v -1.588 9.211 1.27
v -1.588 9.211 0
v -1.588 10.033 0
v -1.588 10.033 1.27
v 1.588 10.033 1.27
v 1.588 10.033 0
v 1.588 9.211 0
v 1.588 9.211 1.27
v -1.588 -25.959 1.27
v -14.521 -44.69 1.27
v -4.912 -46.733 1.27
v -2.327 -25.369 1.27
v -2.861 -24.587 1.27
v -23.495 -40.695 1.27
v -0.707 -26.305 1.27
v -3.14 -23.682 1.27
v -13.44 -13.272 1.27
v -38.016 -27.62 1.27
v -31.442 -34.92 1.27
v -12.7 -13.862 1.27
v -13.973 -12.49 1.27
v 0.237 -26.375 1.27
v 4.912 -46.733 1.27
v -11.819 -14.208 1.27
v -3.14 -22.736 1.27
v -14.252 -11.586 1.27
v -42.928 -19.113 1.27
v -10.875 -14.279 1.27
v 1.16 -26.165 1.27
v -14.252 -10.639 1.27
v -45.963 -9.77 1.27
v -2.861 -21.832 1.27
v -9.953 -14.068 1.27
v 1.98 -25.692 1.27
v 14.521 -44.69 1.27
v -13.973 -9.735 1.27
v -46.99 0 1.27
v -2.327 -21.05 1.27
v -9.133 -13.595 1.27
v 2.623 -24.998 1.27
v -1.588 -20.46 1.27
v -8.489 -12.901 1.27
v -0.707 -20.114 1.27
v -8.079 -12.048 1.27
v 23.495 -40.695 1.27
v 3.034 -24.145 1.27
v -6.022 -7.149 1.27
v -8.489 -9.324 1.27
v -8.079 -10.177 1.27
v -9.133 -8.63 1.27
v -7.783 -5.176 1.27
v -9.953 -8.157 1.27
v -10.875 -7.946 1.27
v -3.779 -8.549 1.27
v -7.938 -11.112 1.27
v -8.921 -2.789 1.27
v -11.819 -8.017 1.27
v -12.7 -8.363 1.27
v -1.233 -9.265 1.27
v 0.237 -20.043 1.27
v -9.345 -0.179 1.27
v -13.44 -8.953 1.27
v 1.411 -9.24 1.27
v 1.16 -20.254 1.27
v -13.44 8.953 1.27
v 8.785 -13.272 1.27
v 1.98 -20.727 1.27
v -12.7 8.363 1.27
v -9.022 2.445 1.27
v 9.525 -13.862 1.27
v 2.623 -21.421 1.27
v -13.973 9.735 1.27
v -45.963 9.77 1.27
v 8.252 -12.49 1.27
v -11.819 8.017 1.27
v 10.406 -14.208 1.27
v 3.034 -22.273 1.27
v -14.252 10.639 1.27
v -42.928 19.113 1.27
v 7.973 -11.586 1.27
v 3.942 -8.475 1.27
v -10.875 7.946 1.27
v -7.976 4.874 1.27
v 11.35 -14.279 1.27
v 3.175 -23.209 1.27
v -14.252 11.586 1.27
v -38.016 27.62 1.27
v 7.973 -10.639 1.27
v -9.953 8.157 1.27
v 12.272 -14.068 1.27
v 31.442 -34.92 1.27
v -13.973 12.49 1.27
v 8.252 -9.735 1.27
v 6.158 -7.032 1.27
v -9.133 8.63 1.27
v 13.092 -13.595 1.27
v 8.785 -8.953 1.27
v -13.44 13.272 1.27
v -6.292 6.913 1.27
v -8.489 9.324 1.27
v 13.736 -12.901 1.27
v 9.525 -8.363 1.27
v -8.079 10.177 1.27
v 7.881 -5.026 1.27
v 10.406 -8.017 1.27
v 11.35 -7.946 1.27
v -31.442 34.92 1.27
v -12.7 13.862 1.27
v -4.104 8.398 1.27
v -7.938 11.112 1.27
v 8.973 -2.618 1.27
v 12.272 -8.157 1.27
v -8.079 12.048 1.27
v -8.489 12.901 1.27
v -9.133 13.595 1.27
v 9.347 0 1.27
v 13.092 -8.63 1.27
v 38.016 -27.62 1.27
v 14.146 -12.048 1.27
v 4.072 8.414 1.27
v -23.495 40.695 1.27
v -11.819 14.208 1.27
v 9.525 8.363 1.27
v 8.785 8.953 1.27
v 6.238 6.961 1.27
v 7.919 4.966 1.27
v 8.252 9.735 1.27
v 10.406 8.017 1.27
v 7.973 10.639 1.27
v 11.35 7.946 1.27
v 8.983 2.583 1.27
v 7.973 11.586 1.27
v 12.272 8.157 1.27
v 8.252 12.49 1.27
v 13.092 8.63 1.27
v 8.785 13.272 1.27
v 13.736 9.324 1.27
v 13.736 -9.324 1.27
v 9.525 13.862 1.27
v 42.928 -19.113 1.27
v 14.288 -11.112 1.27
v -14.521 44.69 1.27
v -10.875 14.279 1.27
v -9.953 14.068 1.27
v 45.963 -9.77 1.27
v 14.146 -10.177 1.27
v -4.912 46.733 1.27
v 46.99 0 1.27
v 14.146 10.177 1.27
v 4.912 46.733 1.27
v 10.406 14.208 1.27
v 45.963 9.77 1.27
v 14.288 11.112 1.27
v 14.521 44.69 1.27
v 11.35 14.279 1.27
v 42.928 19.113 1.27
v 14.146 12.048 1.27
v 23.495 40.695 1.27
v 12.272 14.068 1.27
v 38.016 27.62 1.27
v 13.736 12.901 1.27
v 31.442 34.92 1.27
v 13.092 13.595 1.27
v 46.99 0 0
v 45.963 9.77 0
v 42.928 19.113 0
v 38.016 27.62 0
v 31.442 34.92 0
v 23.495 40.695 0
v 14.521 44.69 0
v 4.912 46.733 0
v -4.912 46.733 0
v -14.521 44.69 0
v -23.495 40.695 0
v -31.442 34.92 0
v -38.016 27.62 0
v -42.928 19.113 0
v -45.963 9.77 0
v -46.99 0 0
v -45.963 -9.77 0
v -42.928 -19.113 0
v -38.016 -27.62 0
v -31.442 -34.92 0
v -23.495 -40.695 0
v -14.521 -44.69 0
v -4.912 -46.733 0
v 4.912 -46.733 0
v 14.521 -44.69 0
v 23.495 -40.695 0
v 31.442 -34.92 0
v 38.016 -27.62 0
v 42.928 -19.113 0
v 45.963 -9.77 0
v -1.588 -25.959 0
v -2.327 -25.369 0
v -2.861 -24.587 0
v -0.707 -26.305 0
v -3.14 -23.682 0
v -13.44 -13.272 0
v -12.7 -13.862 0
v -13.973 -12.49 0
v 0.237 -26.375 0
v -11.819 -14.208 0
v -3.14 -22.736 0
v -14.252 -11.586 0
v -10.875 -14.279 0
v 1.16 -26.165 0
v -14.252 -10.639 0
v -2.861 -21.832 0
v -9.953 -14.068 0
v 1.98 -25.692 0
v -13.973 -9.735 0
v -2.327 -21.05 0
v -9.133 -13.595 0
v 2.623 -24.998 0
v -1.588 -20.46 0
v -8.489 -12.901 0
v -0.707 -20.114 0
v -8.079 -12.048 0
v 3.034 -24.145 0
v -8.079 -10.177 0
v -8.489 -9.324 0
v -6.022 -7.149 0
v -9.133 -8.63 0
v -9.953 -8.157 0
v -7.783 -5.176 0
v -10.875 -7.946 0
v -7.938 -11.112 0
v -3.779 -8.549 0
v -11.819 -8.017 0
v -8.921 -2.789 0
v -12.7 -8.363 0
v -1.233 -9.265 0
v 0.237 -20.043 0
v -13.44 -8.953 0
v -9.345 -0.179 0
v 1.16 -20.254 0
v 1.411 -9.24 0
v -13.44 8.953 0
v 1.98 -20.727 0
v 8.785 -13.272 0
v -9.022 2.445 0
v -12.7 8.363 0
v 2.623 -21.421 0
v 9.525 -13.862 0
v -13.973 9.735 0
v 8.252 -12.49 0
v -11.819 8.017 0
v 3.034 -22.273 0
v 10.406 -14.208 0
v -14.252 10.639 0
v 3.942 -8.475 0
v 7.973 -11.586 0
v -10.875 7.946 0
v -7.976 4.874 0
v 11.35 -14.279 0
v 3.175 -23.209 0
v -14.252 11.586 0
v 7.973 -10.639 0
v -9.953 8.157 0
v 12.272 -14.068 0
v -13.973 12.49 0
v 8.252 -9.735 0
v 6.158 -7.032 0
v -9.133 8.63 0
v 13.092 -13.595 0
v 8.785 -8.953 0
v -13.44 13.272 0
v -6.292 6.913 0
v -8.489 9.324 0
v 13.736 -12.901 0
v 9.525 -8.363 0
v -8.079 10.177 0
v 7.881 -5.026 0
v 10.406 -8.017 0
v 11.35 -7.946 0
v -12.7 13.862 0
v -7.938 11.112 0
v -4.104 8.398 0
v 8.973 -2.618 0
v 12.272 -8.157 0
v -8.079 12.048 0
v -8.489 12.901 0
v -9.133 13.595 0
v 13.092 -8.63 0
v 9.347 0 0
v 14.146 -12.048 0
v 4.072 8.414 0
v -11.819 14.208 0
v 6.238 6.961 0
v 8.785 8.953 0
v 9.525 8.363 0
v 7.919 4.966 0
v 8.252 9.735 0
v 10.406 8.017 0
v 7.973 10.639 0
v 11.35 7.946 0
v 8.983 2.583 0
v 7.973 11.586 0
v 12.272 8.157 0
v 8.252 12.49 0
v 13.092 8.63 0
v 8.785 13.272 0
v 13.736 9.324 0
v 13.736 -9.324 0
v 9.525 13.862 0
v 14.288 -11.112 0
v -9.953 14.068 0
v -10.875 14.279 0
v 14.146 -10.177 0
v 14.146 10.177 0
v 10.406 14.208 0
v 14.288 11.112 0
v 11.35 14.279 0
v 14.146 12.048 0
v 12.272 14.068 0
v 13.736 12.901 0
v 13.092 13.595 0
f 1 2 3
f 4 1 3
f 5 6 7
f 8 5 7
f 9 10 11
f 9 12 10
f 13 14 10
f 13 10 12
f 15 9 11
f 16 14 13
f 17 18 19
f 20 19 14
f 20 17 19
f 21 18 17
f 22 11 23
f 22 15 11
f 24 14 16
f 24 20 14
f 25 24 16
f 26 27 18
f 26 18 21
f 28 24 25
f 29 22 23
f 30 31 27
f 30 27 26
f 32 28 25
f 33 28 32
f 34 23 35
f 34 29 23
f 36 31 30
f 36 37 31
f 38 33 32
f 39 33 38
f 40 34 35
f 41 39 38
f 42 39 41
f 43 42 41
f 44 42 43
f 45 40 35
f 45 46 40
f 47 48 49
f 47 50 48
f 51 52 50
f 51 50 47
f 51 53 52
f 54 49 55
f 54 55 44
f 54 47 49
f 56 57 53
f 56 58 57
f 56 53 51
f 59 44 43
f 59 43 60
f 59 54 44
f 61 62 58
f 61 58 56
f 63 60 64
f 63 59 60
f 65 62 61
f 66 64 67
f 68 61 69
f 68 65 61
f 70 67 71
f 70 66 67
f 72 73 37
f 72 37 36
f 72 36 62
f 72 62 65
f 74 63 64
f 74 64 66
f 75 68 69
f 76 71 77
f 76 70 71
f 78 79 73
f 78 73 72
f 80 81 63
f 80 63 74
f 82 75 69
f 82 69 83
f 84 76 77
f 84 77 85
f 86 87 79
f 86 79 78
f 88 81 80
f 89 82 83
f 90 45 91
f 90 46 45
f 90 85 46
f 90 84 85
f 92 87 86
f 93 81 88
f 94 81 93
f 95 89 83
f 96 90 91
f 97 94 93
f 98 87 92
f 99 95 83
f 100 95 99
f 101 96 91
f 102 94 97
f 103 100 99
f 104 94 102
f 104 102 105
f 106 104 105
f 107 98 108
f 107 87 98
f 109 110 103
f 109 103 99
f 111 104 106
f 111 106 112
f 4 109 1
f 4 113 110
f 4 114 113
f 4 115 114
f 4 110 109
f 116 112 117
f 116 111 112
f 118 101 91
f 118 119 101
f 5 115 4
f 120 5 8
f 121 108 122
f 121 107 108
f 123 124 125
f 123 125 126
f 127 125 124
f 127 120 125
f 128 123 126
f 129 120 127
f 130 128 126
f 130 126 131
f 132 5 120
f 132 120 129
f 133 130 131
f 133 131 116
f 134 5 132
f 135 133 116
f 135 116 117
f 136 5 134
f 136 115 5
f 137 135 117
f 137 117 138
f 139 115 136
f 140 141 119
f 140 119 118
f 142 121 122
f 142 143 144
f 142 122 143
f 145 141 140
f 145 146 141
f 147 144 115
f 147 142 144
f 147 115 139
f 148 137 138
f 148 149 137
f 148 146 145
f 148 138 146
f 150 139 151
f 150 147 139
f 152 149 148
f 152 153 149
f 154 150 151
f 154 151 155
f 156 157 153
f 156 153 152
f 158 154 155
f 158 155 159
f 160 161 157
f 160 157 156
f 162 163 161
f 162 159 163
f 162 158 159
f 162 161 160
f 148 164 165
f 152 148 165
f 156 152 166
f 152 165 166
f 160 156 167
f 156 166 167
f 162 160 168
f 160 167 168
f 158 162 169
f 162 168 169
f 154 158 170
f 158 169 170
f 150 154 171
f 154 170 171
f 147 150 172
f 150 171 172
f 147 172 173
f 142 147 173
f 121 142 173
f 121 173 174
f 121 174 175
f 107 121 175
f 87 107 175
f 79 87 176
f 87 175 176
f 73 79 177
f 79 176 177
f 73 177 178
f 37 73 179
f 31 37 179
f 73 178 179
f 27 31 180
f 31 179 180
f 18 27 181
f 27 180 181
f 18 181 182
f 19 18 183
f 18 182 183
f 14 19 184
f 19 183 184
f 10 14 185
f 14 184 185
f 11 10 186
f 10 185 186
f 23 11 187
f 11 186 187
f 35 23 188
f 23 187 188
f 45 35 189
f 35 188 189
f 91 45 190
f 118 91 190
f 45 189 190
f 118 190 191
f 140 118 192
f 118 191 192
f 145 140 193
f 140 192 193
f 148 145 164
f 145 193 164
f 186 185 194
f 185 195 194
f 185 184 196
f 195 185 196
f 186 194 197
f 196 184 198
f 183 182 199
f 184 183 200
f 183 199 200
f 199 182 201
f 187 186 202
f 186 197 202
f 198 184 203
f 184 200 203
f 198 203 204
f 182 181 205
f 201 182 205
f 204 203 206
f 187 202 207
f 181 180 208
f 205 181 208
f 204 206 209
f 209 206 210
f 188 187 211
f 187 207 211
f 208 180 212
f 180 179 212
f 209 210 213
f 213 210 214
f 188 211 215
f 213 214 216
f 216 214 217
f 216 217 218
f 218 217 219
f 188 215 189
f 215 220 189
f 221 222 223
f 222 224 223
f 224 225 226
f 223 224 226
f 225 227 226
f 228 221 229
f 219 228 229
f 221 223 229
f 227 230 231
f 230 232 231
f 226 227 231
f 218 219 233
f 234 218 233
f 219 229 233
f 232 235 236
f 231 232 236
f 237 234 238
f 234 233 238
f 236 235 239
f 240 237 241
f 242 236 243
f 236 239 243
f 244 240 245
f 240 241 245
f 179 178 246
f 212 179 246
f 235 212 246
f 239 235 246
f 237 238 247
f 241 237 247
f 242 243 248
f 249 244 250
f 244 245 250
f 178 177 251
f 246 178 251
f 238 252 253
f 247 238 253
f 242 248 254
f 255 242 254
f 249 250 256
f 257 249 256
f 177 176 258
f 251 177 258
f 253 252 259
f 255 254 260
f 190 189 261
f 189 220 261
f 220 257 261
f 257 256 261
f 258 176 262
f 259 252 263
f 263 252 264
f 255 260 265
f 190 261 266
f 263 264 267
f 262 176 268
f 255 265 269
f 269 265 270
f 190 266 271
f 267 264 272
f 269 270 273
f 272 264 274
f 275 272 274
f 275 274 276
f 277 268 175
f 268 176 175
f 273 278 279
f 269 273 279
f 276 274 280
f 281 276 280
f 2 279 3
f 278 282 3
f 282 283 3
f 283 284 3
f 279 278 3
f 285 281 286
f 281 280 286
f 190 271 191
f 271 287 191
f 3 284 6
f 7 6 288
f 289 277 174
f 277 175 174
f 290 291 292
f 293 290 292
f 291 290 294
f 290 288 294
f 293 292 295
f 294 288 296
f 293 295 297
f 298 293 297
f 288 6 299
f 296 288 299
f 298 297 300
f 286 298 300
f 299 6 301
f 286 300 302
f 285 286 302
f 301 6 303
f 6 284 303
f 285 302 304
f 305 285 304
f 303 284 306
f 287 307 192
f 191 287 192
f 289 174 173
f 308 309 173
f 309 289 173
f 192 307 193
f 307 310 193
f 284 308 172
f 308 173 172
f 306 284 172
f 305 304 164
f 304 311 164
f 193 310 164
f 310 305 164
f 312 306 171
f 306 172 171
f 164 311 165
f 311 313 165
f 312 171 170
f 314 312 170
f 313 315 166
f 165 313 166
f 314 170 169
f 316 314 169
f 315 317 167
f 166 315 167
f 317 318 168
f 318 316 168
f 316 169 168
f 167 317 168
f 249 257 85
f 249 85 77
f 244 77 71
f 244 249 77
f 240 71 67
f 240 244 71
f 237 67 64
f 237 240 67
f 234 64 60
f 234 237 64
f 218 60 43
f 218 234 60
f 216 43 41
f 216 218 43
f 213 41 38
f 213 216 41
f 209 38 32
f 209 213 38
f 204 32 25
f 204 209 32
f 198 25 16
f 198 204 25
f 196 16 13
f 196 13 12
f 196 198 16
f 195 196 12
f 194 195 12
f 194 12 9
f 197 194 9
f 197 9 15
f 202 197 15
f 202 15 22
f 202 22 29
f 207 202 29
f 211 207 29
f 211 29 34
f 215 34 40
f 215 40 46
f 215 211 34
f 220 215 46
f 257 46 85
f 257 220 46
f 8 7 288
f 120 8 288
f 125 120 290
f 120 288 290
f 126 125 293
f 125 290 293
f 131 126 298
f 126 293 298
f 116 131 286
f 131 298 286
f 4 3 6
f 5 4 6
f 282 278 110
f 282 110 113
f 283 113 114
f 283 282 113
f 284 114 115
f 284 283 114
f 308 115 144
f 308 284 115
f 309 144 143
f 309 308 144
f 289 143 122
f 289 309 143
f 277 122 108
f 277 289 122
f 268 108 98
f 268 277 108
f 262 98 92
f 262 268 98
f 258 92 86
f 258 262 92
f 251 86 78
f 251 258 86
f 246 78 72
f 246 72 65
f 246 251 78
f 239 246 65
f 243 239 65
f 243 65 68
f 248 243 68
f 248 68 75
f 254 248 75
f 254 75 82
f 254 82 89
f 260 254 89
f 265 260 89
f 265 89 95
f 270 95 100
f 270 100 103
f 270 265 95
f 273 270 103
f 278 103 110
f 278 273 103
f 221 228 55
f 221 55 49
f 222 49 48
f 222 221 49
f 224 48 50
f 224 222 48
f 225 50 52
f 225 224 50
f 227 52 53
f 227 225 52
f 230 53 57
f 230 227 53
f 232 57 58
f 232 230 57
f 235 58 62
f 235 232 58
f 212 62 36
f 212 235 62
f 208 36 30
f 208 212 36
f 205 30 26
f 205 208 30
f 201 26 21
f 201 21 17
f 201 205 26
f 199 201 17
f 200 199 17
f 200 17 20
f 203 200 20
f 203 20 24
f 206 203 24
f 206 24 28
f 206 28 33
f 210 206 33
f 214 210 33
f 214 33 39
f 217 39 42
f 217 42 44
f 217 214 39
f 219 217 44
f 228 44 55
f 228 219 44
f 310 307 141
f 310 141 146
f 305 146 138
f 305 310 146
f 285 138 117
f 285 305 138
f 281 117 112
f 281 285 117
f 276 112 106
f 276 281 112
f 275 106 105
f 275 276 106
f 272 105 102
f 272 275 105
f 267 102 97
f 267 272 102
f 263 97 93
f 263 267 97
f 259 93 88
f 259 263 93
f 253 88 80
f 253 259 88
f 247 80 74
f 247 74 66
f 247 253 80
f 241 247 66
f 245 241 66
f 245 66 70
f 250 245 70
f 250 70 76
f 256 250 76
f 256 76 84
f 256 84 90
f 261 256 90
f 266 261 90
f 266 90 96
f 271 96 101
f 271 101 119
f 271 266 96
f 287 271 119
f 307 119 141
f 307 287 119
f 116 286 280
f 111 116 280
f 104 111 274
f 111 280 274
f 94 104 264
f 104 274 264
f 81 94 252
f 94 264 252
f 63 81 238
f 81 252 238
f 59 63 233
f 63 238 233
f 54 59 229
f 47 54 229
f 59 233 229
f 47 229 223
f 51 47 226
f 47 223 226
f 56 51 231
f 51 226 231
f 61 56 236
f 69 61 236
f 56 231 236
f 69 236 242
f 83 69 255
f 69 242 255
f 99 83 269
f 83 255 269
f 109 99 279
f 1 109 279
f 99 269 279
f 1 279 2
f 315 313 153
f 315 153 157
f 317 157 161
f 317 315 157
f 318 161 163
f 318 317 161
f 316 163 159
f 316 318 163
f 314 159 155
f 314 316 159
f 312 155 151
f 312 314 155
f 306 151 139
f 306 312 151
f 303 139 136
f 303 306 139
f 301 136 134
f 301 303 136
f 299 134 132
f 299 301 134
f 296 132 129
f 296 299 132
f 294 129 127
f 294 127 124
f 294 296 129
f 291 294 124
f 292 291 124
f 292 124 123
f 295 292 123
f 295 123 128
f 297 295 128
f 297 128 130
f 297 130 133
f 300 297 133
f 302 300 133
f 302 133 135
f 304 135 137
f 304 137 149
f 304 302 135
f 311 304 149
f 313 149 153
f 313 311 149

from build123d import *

# Parameters (mm, degrees)
F0_R     = 46.99
F0_R_2   = 3.175
F1_DEPTH = 1.27


with BuildPart() as f1:
    # F0 (on Top) → F1 (new body)
    with BuildSketch(Plane.XY):
        Circle(F0_R)
        with Locations((0, -23.20925)):
            Circle(F0_R_2, mode=Mode.SUBTRACT)
        with Locations((-11.1125, -11.1125)):
            Circle(F0_R_2, mode=Mode.SUBTRACT)
        with Locations((11.1125, -11.1125)):
            Circle(F0_R_2, mode=Mode.SUBTRACT)
        with BuildLine():
            ThreePointArc((1.5875, 9.211406), (7.148735, 6.022104), (9.3472, 0))
            ThreePointArc((9.3472, 0), (-6.022104, -7.148735), (-1.5875, 9.211406))
            Line((-1.5875, 9.211406), (-1.5875, 10.033))
            Line((-1.5875, 10.033), (1.5875, 10.033))
            Line((1.5875, 10.033), (1.5875, 9.211406))
        make_face(mode=Mode.SUBTRACT)
        with Locations((-11.1125, 11.1125)):
            Circle(F0_R_2, mode=Mode.SUBTRACT)
        with Locations((11.1125, 11.1125)):
            Circle(F0_R_2, mode=Mode.SUBTRACT)
    extrude(amount=F1_DEPTH)


solid = f1.part
